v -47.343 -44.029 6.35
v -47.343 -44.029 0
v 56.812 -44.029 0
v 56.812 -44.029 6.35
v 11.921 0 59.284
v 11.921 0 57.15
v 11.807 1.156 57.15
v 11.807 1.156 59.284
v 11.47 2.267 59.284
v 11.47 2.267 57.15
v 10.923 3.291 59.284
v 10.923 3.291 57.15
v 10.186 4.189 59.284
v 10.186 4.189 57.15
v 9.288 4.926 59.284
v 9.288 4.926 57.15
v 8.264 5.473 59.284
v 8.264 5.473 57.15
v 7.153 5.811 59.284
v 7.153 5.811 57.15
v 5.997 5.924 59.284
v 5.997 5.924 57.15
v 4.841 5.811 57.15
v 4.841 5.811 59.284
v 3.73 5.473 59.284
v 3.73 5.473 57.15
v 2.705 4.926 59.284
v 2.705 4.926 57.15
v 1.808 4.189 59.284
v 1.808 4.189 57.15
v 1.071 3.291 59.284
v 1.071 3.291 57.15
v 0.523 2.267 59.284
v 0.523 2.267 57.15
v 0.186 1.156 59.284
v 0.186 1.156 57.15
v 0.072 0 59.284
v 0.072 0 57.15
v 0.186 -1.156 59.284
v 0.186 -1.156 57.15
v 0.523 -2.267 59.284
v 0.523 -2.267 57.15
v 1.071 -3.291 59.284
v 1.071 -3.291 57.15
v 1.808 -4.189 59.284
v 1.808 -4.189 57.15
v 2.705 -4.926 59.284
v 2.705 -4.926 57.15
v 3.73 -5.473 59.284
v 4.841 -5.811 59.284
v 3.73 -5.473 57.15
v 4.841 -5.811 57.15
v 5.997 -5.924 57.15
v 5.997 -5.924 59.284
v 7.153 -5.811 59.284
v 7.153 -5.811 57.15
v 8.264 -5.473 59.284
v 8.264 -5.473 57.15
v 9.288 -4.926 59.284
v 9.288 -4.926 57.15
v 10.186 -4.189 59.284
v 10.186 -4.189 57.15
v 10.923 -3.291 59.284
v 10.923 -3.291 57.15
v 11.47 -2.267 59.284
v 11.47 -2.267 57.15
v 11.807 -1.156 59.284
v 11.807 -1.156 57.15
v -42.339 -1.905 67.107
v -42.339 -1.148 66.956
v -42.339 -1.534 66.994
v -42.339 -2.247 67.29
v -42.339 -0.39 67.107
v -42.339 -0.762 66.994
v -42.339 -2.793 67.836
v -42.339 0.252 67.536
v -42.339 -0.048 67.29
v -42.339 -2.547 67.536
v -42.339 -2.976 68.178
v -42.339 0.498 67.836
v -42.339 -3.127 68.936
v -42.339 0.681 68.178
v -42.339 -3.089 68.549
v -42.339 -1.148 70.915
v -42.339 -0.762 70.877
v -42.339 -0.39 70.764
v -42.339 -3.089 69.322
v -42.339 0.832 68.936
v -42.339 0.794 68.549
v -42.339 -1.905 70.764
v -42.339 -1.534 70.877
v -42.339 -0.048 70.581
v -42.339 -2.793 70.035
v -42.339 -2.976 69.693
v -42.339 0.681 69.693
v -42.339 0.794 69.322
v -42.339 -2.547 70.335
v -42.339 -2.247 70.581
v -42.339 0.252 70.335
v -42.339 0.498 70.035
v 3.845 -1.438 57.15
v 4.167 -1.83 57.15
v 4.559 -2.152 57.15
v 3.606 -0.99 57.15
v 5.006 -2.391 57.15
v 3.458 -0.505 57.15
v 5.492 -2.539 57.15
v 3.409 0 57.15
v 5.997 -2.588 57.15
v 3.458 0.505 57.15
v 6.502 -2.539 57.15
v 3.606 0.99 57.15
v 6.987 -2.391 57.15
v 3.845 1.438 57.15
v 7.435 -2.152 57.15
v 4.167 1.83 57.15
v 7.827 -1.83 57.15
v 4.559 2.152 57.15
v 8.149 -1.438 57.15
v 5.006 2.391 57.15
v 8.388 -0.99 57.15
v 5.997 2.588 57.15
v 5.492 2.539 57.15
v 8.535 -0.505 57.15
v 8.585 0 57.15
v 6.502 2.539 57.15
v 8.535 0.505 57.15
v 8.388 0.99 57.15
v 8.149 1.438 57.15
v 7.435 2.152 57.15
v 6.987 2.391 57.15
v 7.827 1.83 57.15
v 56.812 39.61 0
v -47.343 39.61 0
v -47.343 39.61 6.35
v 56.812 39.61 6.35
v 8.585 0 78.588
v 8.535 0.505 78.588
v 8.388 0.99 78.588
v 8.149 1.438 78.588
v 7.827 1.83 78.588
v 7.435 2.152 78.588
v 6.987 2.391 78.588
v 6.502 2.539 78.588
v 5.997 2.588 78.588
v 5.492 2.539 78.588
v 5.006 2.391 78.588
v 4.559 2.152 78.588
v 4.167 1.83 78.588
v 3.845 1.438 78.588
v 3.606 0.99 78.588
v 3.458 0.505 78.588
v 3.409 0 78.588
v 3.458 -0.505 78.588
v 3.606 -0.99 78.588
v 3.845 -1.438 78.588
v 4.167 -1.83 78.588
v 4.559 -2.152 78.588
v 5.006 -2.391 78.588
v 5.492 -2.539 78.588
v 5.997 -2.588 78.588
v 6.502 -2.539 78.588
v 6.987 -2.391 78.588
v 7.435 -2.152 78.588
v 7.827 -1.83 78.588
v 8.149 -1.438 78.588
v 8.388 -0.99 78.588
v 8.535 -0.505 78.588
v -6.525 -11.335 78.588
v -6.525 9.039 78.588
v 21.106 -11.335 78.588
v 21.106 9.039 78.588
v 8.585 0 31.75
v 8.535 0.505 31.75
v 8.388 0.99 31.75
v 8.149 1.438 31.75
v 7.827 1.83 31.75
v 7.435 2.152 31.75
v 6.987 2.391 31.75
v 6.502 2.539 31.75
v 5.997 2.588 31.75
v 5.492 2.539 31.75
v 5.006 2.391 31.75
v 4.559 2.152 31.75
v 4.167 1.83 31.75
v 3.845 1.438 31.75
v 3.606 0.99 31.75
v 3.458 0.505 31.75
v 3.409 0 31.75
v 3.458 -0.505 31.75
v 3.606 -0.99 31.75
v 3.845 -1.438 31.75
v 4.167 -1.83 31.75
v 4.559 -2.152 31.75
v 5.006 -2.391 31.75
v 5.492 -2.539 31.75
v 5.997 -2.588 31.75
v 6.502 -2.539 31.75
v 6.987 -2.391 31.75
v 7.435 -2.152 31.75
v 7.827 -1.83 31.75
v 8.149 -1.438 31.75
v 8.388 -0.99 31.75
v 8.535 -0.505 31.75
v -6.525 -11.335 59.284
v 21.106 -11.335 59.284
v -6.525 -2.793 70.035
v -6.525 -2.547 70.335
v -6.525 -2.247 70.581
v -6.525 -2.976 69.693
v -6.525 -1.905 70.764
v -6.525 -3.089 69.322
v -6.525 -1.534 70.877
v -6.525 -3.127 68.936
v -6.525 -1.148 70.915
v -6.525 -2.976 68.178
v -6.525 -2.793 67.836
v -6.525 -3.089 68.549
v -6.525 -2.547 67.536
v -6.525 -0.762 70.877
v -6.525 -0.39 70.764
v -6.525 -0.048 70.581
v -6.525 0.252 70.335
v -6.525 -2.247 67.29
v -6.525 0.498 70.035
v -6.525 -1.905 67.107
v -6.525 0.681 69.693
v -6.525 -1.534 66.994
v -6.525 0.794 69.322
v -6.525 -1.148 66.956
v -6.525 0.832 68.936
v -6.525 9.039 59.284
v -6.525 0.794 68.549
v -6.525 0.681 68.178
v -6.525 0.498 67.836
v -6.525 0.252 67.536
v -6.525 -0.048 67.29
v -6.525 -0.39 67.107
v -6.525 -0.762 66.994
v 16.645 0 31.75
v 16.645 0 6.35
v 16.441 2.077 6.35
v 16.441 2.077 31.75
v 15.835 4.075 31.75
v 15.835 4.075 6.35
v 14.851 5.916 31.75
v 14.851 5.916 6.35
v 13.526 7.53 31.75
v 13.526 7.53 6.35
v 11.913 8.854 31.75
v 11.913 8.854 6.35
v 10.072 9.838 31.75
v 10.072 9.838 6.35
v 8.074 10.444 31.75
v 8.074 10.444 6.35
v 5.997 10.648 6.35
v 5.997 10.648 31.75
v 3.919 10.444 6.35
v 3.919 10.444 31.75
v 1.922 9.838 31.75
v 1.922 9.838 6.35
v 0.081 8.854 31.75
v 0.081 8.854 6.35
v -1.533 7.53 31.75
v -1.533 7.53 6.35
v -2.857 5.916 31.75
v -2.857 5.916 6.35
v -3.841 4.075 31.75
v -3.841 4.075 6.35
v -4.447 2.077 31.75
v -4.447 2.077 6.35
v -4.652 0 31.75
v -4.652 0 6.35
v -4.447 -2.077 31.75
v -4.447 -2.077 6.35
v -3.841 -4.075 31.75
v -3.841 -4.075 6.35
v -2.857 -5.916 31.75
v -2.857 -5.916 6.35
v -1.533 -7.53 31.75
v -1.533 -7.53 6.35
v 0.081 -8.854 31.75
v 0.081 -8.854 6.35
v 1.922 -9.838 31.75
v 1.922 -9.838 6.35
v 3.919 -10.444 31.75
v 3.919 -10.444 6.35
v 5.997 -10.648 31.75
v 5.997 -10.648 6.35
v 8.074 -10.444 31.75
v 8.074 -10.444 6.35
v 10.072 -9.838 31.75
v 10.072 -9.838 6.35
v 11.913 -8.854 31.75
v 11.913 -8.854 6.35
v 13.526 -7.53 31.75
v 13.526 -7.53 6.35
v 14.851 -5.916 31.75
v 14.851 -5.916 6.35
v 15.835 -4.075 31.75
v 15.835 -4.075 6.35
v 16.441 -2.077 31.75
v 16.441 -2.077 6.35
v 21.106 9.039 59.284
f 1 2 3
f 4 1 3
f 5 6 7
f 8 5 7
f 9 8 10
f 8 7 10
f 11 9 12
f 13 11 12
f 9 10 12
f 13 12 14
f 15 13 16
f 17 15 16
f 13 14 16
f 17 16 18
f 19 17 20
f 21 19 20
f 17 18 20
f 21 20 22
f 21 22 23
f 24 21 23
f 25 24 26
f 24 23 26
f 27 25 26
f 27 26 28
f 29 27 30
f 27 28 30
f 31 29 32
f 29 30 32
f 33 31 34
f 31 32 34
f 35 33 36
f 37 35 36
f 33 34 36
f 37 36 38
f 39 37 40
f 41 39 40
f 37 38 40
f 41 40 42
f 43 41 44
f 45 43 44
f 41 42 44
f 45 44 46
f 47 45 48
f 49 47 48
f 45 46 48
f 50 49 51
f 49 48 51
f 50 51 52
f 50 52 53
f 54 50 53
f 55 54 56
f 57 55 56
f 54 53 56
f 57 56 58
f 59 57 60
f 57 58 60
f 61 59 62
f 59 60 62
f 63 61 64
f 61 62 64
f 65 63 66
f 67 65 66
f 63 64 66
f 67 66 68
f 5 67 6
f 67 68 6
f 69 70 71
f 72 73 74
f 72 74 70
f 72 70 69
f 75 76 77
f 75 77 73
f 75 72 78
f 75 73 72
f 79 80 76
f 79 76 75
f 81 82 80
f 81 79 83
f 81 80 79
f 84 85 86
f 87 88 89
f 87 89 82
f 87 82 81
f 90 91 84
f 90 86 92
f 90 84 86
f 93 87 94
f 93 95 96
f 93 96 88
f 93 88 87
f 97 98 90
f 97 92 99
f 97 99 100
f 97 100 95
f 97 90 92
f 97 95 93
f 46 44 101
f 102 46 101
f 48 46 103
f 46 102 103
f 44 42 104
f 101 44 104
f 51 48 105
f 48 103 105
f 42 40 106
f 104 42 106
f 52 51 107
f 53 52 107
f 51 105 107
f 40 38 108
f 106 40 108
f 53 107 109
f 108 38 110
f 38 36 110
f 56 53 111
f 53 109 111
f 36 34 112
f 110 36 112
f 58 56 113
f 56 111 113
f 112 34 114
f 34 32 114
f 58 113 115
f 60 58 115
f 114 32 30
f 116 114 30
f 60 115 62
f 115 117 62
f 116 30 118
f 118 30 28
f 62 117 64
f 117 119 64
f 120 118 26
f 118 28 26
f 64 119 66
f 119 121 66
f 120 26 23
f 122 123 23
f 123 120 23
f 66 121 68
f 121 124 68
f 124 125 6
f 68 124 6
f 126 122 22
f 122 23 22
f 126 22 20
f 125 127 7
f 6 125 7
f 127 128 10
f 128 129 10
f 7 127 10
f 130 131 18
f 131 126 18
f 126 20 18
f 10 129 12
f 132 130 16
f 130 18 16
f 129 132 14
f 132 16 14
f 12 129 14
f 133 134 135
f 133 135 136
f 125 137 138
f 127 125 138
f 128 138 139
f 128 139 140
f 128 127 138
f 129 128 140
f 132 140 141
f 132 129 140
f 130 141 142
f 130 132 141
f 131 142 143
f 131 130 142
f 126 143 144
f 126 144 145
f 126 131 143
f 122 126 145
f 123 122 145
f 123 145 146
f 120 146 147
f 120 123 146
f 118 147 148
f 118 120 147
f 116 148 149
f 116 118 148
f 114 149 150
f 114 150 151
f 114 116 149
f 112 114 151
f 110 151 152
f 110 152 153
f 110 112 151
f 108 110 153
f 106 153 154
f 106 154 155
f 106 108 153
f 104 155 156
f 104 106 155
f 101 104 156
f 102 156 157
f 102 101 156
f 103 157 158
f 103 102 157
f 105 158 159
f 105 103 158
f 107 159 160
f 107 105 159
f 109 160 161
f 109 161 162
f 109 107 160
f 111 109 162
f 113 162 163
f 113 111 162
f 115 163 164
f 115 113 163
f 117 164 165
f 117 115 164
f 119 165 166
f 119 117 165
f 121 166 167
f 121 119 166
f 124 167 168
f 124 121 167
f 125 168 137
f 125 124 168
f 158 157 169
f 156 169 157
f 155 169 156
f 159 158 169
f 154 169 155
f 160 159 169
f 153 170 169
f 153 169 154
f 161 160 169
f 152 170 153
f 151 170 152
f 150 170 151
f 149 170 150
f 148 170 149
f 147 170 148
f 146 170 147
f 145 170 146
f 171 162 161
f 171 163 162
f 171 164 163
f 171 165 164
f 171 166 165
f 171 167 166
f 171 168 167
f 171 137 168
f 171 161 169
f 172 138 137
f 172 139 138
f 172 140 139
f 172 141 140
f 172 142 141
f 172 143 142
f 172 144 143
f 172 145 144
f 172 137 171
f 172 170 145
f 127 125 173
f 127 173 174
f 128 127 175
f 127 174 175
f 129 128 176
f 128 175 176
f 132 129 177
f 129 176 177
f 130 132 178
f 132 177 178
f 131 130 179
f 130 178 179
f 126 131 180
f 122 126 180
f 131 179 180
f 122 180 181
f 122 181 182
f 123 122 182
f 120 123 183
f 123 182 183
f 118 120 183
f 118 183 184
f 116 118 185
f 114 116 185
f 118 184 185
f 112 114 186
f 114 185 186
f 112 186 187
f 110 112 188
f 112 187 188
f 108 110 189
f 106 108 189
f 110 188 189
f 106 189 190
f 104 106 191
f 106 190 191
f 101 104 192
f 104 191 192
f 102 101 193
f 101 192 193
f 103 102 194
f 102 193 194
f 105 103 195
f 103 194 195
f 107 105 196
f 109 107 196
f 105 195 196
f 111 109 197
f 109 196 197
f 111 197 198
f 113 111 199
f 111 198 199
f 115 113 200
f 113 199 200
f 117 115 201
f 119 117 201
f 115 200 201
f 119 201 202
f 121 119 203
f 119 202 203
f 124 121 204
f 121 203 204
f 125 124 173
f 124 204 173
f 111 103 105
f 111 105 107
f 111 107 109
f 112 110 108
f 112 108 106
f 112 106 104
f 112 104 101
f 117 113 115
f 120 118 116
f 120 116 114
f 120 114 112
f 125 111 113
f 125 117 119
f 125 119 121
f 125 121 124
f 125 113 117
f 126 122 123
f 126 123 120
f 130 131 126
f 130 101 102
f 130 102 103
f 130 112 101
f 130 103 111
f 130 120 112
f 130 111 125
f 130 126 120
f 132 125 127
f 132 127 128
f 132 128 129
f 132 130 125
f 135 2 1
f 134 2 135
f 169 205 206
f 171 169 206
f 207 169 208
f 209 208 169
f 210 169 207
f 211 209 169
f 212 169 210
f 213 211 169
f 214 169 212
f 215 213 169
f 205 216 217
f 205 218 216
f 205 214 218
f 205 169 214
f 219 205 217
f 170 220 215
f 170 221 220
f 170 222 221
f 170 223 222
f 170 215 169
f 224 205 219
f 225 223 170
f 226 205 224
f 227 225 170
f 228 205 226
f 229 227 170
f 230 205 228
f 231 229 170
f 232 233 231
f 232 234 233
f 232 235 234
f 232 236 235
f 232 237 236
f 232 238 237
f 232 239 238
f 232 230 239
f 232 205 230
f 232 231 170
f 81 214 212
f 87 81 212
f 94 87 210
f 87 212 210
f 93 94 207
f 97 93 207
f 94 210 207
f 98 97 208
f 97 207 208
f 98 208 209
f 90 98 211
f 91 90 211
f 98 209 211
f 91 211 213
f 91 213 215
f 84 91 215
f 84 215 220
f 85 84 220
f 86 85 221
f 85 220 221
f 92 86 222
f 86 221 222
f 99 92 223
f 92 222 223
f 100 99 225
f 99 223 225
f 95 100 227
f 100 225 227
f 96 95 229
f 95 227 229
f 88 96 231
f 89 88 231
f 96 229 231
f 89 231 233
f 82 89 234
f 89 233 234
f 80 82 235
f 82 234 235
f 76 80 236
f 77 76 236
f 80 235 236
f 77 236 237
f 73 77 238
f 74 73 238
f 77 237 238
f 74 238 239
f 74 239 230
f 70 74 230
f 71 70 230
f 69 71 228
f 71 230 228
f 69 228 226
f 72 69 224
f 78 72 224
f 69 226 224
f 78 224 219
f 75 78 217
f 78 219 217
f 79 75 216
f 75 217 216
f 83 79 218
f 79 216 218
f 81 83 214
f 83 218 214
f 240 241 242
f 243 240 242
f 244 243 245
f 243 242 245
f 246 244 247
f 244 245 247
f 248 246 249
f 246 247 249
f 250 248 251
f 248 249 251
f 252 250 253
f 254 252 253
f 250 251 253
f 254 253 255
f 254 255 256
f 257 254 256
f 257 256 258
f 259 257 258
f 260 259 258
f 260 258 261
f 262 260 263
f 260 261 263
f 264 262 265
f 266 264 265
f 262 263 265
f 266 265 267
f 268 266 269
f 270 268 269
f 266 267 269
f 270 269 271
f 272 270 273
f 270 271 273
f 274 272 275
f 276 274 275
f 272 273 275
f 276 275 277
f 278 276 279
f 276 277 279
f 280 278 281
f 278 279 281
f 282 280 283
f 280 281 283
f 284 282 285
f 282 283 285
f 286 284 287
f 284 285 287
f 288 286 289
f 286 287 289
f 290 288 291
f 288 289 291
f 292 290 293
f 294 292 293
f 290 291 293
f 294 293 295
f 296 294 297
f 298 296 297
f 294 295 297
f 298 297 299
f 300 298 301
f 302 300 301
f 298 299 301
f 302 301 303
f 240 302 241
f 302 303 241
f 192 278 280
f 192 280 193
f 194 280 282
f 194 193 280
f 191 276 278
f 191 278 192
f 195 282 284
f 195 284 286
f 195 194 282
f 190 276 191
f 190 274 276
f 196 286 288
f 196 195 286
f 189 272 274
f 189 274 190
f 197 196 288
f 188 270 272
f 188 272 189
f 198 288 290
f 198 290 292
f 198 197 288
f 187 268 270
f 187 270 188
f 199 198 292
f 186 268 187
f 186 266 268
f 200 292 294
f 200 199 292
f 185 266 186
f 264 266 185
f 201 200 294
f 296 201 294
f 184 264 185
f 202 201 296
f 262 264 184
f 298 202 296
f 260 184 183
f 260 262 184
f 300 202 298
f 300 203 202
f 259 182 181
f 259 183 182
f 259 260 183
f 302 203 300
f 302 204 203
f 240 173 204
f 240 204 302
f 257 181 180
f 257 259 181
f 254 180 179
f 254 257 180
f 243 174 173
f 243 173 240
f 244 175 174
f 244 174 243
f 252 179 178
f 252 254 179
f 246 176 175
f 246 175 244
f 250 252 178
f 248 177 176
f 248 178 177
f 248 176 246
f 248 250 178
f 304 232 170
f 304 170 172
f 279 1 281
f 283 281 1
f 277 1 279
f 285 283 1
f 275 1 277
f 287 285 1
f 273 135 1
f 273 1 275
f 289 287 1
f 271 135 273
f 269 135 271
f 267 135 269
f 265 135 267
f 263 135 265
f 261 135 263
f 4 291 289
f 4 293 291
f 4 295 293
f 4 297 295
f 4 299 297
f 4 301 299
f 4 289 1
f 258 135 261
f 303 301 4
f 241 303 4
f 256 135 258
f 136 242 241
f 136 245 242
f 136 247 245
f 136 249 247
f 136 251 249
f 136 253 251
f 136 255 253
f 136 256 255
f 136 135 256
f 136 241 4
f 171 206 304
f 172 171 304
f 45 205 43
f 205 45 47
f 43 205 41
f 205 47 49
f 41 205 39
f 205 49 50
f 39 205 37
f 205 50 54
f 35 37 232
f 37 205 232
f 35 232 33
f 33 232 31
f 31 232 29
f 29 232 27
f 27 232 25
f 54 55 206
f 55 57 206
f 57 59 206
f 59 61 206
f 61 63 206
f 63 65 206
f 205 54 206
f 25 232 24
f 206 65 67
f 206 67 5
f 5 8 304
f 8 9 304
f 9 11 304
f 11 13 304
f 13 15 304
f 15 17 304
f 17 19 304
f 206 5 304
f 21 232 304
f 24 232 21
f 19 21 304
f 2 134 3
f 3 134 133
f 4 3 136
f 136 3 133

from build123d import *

# Parameters (mm, degrees)
F0_W      = 104.1550263762
F0_H      = 83.6396403611
F1_DEPTH  = 6.35
F2_R      = 10.6484178823
F3_DEPTH  = 25.4
F5_R      = 2.5882869315
F6_DEPTH  = 25.4
F7_R      = 5.9244502738
F7_R_2    = 2.5882869315
F8_DEPTH  = 2.1336
F9_W      = 27.6307915337
F9_H      = 20.3739050776
F9_R      = 5.9244502738
F9_R_2    = 2.5882869315
F10_DEPTH = 19.304
F11_R     = 1.9793730785
F12_DEPTH = 35.814


with BuildPart() as f1:
    # F0 (on Top) → F1 (new body)
    with BuildSketch(Plane.XY):
        with Locations((4.7343187034, -2.2093486041)):
            Rectangle(F0_W, F0_H)
    extrude(amount=F1_DEPTH)

    # F2 (on face) → F3 (join)
    with BuildSketch(Plane.XY.offset(6.35)):
        with Locations((5.9968070127, 0)):
            Circle(F2_R)
    extrude(amount=F3_DEPTH)

    # F5 (on face) → F6 (join)
    with BuildSketch(Plane.XY.offset(31.75)):
        with Locations((5.9968070127, 0)):
            Circle(F5_R)
    extrude(amount=F6_DEPTH)


with BuildPart() as f8:
    # F7 (on face) → F8 (new body)
    with BuildSketch(Plane.XY.offset(57.15)):
        with Locations((5.9968070127, 0)):
            Circle(F7_R)
        with Locations((5.9968070127, 0)):
            Circle(F7_R_2, mode=Mode.SUBTRACT)
    extrude(amount=F8_DEPTH)

    # F9 (on face) → F10 (join)
    with BuildSketch(Plane.XY.offset(59.2836)):
        with Locations((7.2904357221, -1.1476604268)):
            Rectangle(F9_W, F9_H)
        with Locations((5.9968070127, 0)):
            Circle(F9_R, mode=Mode.SUBTRACT)
        with Locations((5.9968070127, 0)):
            Circle(F9_R)
        with Locations((5.9968070127, 0)):
            Circle(F9_R_2, mode=Mode.SUBTRACT)
    extrude(amount=F10_DEPTH)

    # F11 (on face) → F12 (join)
    with BuildSketch(Plane(origin=(-6.5249600448, 0, 0), x_dir=(0, -1, 0), z_dir=(-1, 0, 0))):
        with Locations((1.1476604268, 68.9356)):
            Circle(F11_R)
    extrude(amount=F12_DEPTH)


solid = Compound([f1.part, f8.part])
